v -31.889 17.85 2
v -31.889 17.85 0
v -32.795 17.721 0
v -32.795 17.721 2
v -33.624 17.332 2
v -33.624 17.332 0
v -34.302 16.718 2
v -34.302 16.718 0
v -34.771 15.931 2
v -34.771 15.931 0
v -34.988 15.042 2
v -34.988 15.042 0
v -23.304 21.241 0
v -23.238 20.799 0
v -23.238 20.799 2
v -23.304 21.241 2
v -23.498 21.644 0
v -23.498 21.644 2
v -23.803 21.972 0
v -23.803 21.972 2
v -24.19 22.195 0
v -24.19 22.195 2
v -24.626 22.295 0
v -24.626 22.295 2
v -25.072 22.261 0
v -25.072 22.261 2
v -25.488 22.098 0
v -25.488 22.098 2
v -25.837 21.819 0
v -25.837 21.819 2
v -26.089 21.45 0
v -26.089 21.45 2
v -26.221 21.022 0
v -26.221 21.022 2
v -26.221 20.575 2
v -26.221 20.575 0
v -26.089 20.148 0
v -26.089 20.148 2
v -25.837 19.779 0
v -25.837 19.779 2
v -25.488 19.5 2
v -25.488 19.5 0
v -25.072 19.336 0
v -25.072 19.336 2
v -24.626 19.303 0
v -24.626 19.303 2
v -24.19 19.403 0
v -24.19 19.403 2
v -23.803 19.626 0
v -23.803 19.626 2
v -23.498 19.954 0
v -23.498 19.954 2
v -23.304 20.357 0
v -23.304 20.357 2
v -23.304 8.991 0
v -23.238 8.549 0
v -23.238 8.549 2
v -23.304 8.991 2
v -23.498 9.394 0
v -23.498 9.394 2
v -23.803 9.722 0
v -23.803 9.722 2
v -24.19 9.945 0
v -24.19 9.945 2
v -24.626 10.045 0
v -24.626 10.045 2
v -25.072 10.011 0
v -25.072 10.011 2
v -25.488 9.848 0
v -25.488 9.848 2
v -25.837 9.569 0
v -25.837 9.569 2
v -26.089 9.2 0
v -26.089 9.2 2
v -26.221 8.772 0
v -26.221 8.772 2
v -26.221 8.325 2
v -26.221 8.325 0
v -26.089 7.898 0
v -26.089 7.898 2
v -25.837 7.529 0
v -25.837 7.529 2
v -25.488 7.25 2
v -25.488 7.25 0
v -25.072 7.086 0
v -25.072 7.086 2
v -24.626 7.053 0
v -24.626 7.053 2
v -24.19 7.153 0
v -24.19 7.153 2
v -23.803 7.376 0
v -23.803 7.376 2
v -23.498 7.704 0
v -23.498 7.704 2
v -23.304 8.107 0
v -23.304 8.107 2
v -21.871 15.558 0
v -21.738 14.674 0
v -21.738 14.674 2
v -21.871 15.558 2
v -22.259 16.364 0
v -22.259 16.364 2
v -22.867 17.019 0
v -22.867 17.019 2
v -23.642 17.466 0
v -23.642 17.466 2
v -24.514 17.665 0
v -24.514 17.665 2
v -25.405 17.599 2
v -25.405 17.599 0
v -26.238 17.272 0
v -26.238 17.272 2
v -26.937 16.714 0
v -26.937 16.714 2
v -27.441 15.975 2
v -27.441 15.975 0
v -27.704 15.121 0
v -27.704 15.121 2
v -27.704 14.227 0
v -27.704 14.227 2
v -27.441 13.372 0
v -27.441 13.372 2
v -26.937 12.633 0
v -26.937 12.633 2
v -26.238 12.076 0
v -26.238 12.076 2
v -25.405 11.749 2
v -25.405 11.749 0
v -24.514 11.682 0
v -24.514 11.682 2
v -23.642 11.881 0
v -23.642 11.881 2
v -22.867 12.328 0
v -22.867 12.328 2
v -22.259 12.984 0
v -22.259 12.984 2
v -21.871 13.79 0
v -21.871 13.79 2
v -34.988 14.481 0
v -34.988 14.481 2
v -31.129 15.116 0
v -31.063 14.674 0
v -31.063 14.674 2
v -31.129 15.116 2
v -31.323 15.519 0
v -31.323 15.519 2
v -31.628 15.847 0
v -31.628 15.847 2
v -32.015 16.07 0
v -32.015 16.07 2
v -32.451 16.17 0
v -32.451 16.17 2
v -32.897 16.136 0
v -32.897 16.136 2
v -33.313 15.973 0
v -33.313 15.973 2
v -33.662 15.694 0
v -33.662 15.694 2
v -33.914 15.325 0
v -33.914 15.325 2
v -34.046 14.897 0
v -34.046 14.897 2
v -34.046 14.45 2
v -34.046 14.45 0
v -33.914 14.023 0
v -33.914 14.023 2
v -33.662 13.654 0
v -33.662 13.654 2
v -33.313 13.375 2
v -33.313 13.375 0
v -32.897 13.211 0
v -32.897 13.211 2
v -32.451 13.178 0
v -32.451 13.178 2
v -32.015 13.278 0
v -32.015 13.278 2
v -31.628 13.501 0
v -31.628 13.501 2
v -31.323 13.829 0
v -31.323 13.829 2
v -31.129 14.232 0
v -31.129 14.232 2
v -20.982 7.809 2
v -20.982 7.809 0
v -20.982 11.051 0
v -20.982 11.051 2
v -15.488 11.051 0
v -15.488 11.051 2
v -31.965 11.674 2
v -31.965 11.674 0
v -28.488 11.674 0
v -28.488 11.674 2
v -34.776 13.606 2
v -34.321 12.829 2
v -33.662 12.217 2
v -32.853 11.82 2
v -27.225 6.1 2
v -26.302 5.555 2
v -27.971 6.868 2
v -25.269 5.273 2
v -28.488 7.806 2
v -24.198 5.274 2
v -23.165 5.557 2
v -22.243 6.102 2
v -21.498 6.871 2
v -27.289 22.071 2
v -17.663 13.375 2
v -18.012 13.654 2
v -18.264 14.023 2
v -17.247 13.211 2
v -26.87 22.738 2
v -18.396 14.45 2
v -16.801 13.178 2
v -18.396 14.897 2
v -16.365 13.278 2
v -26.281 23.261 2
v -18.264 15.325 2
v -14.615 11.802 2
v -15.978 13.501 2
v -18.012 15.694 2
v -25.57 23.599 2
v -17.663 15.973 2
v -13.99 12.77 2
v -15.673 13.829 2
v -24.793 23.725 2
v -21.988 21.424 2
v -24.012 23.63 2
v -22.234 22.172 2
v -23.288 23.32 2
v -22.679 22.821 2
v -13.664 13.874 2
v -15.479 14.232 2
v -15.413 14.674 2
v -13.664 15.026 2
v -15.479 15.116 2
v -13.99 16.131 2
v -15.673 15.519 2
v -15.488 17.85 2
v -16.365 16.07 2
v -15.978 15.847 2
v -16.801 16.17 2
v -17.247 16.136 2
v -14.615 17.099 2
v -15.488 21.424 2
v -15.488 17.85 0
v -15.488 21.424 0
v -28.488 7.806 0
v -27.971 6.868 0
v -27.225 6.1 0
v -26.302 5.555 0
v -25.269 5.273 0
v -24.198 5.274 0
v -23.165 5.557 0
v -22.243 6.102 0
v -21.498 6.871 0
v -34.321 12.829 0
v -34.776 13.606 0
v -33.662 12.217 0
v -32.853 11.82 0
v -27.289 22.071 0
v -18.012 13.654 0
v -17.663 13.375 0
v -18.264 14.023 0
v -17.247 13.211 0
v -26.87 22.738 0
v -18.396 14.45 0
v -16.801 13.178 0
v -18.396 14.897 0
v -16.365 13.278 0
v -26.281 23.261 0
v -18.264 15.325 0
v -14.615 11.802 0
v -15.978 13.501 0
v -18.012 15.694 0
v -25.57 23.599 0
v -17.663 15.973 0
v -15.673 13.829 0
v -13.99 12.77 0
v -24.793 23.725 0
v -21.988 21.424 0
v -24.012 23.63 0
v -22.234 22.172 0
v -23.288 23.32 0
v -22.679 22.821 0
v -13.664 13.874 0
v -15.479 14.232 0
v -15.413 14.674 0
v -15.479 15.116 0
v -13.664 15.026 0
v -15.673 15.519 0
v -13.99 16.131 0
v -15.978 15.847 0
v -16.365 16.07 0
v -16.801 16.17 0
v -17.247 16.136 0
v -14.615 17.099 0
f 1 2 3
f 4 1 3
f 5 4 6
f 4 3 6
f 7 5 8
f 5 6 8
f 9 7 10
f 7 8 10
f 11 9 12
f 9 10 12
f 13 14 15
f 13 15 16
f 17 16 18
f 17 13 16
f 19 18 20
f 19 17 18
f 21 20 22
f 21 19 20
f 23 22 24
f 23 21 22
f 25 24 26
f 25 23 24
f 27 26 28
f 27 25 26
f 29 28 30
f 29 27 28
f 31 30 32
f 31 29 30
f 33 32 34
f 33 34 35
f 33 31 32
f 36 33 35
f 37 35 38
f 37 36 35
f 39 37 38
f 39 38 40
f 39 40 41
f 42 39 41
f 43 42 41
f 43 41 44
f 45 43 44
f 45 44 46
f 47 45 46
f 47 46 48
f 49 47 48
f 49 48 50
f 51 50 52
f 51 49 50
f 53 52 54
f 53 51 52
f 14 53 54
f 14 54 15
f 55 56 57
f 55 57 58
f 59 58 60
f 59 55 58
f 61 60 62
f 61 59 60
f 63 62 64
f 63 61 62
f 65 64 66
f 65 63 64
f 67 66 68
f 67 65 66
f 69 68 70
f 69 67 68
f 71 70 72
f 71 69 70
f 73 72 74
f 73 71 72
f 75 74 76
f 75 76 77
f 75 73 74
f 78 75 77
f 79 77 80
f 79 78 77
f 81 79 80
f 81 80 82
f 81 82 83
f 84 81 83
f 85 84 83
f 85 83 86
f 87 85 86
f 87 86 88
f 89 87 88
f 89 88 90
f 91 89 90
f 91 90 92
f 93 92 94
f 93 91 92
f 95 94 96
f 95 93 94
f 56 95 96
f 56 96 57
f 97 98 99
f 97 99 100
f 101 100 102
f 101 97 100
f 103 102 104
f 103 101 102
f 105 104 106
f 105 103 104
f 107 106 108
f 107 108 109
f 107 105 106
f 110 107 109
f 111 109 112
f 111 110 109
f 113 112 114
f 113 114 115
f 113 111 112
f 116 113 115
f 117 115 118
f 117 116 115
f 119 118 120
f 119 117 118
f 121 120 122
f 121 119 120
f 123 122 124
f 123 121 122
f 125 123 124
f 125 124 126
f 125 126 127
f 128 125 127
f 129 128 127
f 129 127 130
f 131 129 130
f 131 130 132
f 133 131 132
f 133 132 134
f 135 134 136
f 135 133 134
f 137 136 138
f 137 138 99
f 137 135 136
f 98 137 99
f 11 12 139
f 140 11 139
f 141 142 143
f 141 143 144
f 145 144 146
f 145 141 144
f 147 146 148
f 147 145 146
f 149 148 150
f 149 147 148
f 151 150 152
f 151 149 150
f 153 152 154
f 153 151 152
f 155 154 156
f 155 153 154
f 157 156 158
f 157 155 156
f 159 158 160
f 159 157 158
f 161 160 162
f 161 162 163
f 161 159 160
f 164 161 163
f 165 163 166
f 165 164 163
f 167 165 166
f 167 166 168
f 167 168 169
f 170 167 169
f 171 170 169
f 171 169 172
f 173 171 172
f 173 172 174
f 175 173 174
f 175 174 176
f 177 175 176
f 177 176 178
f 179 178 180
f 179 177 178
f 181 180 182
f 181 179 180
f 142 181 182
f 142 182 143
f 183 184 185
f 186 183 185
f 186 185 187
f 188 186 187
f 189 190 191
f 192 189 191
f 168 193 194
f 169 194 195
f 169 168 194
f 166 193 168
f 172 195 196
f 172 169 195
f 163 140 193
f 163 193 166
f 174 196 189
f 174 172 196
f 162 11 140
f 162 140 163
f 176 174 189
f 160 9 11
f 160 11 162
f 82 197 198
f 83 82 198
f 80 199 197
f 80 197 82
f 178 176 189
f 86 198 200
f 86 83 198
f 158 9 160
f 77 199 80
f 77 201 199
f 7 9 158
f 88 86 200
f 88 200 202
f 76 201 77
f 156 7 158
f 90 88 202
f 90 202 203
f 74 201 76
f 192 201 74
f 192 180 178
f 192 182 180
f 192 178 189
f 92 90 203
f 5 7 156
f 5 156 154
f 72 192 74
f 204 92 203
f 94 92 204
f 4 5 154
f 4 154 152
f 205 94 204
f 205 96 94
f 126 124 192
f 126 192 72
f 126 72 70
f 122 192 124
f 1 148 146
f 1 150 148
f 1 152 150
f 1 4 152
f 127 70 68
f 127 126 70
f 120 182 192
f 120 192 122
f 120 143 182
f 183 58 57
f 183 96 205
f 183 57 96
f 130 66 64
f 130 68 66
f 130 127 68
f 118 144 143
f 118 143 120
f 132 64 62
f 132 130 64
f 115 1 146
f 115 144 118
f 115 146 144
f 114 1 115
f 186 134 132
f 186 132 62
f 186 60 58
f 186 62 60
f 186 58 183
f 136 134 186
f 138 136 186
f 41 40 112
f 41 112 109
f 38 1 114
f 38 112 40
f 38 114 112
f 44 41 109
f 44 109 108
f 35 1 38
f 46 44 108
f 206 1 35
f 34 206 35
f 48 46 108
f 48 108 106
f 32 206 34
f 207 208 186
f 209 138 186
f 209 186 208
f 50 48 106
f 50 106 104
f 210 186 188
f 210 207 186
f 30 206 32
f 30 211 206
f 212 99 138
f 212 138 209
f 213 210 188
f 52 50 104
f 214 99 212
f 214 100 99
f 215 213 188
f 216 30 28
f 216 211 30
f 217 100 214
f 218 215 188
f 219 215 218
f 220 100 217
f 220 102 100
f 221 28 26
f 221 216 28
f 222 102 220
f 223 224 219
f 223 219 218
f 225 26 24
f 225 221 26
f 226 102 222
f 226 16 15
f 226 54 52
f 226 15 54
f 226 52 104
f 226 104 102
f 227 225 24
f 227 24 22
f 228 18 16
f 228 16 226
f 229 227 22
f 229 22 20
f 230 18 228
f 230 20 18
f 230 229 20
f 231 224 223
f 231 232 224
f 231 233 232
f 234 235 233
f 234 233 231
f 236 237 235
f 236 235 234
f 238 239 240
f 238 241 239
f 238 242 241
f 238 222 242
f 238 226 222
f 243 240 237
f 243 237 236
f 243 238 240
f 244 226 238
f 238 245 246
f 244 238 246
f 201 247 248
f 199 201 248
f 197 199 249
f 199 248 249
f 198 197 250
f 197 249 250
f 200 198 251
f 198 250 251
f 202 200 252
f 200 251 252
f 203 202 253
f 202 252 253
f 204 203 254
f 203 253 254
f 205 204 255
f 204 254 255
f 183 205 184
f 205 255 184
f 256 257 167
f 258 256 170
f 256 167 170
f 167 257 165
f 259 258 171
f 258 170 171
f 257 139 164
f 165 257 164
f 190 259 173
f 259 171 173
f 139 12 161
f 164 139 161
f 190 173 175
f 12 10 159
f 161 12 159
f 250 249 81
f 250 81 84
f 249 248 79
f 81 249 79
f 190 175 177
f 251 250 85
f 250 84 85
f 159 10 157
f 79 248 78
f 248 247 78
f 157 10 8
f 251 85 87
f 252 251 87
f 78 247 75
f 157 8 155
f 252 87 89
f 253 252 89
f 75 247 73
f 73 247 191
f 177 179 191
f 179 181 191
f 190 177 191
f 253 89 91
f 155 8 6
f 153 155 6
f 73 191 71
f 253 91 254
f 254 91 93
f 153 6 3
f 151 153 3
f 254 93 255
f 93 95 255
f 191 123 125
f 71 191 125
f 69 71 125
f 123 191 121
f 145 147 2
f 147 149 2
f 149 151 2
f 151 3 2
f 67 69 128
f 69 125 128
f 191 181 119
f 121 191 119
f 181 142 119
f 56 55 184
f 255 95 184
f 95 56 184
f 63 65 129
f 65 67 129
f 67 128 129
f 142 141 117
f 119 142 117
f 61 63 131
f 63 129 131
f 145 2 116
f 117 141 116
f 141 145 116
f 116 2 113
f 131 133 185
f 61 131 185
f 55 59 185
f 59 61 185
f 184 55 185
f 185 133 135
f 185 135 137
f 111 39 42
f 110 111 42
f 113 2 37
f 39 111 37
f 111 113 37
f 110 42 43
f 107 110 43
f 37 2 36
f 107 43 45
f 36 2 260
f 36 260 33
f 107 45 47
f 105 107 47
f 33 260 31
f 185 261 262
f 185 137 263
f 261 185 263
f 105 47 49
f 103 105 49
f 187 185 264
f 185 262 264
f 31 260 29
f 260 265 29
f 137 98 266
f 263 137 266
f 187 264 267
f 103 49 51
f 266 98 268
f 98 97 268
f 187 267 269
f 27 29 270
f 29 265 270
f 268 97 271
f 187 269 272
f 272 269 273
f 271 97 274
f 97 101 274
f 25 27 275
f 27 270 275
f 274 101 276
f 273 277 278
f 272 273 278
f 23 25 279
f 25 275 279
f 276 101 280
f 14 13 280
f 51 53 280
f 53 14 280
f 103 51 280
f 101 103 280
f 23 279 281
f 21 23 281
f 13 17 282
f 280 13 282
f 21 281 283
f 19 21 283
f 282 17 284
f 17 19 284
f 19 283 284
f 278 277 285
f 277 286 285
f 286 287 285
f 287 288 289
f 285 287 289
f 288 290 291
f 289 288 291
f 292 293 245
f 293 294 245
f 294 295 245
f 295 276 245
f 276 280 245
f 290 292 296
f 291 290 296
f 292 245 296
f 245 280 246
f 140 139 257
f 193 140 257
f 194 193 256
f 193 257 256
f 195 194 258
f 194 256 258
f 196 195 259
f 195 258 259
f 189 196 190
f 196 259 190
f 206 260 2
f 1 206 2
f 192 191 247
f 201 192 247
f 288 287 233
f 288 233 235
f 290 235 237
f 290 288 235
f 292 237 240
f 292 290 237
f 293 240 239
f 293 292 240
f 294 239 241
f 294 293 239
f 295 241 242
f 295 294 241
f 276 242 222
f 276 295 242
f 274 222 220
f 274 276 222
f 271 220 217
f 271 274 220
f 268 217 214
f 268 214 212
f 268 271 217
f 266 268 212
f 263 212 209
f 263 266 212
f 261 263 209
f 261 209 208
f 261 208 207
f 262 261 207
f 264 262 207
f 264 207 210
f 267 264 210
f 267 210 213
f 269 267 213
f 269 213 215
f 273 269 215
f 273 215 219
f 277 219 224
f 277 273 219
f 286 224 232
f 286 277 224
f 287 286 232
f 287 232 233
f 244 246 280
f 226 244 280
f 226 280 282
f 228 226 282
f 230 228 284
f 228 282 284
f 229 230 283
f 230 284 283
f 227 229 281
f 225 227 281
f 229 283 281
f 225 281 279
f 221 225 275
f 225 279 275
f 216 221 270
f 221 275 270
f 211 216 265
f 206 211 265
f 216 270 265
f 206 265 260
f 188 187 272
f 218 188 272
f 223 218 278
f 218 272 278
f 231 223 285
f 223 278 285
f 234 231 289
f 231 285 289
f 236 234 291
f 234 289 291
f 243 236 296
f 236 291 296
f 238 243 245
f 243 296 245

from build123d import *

# Parameters (mm, degrees)
F0_R     = 1.5
F0_R_2   = 3
F1_DEPTH = 2


with BuildPart() as f1:
    # F0 (on Top) → F1 (new body)
    with BuildSketch(Plane.XY):
        with BuildLine():
            Line((-31.964893, 11.673815), (-28.487817, 11.673815))
            Line((-28.487817, 11.673815), (-28.487817, 7.80591))
            ThreePointArc((-28.487817, 7.80591), (-24.73358, 5.237709), (-20.981651, 7.80928))
            Line((-20.981651, 7.80928), (-20.981651, 11.050785))
            Line((-20.981651, 11.050785), (-15.487817, 11.050785))
            ThreePointArc((-15.487817, 11.050785), (-13.62272, 14.450413), (-15.487817, 17.850041))
            Line((-15.487817, 17.850041), (-15.487817, 21.423815))
            Line((-15.487817, 21.423815), (-21.987817, 21.423815))
            ThreePointArc((-21.987817, 21.423815), (-24.399065, 23.705329), (-27.288638, 22.071378))
            Line((-27.288638, 22.071378), (-31.889195, 17.850041))
            ThreePointArc((-31.889195, 17.850041), (-33.985999, 17.050288), (-34.987817, 15.042166))
            Line((-34.987817, 15.042166), (-34.987817, 14.481326))
            ThreePointArc((-34.987817, 14.481326), (-34.01389, 12.498791), (-31.964893, 11.673815))
        make_face()
        with Locations((-24.737817, 8.548815)):
            Circle(F0_R, mode=Mode.SUBTRACT)
        with Locations((-32.562817, 14.673815)):
            Circle(F0_R, mode=Mode.SUBTRACT)
        with Locations((-24.737817, 14.673815)):
            Circle(F0_R_2, mode=Mode.SUBTRACT)
        with Locations((-24.737817, 20.798815)):
            Circle(F0_R, mode=Mode.SUBTRACT)
        with Locations((-16.912817, 14.673815)):
            Circle(F0_R, mode=Mode.SUBTRACT)
    extrude(amount=F1_DEPTH)


solid = f1.part
